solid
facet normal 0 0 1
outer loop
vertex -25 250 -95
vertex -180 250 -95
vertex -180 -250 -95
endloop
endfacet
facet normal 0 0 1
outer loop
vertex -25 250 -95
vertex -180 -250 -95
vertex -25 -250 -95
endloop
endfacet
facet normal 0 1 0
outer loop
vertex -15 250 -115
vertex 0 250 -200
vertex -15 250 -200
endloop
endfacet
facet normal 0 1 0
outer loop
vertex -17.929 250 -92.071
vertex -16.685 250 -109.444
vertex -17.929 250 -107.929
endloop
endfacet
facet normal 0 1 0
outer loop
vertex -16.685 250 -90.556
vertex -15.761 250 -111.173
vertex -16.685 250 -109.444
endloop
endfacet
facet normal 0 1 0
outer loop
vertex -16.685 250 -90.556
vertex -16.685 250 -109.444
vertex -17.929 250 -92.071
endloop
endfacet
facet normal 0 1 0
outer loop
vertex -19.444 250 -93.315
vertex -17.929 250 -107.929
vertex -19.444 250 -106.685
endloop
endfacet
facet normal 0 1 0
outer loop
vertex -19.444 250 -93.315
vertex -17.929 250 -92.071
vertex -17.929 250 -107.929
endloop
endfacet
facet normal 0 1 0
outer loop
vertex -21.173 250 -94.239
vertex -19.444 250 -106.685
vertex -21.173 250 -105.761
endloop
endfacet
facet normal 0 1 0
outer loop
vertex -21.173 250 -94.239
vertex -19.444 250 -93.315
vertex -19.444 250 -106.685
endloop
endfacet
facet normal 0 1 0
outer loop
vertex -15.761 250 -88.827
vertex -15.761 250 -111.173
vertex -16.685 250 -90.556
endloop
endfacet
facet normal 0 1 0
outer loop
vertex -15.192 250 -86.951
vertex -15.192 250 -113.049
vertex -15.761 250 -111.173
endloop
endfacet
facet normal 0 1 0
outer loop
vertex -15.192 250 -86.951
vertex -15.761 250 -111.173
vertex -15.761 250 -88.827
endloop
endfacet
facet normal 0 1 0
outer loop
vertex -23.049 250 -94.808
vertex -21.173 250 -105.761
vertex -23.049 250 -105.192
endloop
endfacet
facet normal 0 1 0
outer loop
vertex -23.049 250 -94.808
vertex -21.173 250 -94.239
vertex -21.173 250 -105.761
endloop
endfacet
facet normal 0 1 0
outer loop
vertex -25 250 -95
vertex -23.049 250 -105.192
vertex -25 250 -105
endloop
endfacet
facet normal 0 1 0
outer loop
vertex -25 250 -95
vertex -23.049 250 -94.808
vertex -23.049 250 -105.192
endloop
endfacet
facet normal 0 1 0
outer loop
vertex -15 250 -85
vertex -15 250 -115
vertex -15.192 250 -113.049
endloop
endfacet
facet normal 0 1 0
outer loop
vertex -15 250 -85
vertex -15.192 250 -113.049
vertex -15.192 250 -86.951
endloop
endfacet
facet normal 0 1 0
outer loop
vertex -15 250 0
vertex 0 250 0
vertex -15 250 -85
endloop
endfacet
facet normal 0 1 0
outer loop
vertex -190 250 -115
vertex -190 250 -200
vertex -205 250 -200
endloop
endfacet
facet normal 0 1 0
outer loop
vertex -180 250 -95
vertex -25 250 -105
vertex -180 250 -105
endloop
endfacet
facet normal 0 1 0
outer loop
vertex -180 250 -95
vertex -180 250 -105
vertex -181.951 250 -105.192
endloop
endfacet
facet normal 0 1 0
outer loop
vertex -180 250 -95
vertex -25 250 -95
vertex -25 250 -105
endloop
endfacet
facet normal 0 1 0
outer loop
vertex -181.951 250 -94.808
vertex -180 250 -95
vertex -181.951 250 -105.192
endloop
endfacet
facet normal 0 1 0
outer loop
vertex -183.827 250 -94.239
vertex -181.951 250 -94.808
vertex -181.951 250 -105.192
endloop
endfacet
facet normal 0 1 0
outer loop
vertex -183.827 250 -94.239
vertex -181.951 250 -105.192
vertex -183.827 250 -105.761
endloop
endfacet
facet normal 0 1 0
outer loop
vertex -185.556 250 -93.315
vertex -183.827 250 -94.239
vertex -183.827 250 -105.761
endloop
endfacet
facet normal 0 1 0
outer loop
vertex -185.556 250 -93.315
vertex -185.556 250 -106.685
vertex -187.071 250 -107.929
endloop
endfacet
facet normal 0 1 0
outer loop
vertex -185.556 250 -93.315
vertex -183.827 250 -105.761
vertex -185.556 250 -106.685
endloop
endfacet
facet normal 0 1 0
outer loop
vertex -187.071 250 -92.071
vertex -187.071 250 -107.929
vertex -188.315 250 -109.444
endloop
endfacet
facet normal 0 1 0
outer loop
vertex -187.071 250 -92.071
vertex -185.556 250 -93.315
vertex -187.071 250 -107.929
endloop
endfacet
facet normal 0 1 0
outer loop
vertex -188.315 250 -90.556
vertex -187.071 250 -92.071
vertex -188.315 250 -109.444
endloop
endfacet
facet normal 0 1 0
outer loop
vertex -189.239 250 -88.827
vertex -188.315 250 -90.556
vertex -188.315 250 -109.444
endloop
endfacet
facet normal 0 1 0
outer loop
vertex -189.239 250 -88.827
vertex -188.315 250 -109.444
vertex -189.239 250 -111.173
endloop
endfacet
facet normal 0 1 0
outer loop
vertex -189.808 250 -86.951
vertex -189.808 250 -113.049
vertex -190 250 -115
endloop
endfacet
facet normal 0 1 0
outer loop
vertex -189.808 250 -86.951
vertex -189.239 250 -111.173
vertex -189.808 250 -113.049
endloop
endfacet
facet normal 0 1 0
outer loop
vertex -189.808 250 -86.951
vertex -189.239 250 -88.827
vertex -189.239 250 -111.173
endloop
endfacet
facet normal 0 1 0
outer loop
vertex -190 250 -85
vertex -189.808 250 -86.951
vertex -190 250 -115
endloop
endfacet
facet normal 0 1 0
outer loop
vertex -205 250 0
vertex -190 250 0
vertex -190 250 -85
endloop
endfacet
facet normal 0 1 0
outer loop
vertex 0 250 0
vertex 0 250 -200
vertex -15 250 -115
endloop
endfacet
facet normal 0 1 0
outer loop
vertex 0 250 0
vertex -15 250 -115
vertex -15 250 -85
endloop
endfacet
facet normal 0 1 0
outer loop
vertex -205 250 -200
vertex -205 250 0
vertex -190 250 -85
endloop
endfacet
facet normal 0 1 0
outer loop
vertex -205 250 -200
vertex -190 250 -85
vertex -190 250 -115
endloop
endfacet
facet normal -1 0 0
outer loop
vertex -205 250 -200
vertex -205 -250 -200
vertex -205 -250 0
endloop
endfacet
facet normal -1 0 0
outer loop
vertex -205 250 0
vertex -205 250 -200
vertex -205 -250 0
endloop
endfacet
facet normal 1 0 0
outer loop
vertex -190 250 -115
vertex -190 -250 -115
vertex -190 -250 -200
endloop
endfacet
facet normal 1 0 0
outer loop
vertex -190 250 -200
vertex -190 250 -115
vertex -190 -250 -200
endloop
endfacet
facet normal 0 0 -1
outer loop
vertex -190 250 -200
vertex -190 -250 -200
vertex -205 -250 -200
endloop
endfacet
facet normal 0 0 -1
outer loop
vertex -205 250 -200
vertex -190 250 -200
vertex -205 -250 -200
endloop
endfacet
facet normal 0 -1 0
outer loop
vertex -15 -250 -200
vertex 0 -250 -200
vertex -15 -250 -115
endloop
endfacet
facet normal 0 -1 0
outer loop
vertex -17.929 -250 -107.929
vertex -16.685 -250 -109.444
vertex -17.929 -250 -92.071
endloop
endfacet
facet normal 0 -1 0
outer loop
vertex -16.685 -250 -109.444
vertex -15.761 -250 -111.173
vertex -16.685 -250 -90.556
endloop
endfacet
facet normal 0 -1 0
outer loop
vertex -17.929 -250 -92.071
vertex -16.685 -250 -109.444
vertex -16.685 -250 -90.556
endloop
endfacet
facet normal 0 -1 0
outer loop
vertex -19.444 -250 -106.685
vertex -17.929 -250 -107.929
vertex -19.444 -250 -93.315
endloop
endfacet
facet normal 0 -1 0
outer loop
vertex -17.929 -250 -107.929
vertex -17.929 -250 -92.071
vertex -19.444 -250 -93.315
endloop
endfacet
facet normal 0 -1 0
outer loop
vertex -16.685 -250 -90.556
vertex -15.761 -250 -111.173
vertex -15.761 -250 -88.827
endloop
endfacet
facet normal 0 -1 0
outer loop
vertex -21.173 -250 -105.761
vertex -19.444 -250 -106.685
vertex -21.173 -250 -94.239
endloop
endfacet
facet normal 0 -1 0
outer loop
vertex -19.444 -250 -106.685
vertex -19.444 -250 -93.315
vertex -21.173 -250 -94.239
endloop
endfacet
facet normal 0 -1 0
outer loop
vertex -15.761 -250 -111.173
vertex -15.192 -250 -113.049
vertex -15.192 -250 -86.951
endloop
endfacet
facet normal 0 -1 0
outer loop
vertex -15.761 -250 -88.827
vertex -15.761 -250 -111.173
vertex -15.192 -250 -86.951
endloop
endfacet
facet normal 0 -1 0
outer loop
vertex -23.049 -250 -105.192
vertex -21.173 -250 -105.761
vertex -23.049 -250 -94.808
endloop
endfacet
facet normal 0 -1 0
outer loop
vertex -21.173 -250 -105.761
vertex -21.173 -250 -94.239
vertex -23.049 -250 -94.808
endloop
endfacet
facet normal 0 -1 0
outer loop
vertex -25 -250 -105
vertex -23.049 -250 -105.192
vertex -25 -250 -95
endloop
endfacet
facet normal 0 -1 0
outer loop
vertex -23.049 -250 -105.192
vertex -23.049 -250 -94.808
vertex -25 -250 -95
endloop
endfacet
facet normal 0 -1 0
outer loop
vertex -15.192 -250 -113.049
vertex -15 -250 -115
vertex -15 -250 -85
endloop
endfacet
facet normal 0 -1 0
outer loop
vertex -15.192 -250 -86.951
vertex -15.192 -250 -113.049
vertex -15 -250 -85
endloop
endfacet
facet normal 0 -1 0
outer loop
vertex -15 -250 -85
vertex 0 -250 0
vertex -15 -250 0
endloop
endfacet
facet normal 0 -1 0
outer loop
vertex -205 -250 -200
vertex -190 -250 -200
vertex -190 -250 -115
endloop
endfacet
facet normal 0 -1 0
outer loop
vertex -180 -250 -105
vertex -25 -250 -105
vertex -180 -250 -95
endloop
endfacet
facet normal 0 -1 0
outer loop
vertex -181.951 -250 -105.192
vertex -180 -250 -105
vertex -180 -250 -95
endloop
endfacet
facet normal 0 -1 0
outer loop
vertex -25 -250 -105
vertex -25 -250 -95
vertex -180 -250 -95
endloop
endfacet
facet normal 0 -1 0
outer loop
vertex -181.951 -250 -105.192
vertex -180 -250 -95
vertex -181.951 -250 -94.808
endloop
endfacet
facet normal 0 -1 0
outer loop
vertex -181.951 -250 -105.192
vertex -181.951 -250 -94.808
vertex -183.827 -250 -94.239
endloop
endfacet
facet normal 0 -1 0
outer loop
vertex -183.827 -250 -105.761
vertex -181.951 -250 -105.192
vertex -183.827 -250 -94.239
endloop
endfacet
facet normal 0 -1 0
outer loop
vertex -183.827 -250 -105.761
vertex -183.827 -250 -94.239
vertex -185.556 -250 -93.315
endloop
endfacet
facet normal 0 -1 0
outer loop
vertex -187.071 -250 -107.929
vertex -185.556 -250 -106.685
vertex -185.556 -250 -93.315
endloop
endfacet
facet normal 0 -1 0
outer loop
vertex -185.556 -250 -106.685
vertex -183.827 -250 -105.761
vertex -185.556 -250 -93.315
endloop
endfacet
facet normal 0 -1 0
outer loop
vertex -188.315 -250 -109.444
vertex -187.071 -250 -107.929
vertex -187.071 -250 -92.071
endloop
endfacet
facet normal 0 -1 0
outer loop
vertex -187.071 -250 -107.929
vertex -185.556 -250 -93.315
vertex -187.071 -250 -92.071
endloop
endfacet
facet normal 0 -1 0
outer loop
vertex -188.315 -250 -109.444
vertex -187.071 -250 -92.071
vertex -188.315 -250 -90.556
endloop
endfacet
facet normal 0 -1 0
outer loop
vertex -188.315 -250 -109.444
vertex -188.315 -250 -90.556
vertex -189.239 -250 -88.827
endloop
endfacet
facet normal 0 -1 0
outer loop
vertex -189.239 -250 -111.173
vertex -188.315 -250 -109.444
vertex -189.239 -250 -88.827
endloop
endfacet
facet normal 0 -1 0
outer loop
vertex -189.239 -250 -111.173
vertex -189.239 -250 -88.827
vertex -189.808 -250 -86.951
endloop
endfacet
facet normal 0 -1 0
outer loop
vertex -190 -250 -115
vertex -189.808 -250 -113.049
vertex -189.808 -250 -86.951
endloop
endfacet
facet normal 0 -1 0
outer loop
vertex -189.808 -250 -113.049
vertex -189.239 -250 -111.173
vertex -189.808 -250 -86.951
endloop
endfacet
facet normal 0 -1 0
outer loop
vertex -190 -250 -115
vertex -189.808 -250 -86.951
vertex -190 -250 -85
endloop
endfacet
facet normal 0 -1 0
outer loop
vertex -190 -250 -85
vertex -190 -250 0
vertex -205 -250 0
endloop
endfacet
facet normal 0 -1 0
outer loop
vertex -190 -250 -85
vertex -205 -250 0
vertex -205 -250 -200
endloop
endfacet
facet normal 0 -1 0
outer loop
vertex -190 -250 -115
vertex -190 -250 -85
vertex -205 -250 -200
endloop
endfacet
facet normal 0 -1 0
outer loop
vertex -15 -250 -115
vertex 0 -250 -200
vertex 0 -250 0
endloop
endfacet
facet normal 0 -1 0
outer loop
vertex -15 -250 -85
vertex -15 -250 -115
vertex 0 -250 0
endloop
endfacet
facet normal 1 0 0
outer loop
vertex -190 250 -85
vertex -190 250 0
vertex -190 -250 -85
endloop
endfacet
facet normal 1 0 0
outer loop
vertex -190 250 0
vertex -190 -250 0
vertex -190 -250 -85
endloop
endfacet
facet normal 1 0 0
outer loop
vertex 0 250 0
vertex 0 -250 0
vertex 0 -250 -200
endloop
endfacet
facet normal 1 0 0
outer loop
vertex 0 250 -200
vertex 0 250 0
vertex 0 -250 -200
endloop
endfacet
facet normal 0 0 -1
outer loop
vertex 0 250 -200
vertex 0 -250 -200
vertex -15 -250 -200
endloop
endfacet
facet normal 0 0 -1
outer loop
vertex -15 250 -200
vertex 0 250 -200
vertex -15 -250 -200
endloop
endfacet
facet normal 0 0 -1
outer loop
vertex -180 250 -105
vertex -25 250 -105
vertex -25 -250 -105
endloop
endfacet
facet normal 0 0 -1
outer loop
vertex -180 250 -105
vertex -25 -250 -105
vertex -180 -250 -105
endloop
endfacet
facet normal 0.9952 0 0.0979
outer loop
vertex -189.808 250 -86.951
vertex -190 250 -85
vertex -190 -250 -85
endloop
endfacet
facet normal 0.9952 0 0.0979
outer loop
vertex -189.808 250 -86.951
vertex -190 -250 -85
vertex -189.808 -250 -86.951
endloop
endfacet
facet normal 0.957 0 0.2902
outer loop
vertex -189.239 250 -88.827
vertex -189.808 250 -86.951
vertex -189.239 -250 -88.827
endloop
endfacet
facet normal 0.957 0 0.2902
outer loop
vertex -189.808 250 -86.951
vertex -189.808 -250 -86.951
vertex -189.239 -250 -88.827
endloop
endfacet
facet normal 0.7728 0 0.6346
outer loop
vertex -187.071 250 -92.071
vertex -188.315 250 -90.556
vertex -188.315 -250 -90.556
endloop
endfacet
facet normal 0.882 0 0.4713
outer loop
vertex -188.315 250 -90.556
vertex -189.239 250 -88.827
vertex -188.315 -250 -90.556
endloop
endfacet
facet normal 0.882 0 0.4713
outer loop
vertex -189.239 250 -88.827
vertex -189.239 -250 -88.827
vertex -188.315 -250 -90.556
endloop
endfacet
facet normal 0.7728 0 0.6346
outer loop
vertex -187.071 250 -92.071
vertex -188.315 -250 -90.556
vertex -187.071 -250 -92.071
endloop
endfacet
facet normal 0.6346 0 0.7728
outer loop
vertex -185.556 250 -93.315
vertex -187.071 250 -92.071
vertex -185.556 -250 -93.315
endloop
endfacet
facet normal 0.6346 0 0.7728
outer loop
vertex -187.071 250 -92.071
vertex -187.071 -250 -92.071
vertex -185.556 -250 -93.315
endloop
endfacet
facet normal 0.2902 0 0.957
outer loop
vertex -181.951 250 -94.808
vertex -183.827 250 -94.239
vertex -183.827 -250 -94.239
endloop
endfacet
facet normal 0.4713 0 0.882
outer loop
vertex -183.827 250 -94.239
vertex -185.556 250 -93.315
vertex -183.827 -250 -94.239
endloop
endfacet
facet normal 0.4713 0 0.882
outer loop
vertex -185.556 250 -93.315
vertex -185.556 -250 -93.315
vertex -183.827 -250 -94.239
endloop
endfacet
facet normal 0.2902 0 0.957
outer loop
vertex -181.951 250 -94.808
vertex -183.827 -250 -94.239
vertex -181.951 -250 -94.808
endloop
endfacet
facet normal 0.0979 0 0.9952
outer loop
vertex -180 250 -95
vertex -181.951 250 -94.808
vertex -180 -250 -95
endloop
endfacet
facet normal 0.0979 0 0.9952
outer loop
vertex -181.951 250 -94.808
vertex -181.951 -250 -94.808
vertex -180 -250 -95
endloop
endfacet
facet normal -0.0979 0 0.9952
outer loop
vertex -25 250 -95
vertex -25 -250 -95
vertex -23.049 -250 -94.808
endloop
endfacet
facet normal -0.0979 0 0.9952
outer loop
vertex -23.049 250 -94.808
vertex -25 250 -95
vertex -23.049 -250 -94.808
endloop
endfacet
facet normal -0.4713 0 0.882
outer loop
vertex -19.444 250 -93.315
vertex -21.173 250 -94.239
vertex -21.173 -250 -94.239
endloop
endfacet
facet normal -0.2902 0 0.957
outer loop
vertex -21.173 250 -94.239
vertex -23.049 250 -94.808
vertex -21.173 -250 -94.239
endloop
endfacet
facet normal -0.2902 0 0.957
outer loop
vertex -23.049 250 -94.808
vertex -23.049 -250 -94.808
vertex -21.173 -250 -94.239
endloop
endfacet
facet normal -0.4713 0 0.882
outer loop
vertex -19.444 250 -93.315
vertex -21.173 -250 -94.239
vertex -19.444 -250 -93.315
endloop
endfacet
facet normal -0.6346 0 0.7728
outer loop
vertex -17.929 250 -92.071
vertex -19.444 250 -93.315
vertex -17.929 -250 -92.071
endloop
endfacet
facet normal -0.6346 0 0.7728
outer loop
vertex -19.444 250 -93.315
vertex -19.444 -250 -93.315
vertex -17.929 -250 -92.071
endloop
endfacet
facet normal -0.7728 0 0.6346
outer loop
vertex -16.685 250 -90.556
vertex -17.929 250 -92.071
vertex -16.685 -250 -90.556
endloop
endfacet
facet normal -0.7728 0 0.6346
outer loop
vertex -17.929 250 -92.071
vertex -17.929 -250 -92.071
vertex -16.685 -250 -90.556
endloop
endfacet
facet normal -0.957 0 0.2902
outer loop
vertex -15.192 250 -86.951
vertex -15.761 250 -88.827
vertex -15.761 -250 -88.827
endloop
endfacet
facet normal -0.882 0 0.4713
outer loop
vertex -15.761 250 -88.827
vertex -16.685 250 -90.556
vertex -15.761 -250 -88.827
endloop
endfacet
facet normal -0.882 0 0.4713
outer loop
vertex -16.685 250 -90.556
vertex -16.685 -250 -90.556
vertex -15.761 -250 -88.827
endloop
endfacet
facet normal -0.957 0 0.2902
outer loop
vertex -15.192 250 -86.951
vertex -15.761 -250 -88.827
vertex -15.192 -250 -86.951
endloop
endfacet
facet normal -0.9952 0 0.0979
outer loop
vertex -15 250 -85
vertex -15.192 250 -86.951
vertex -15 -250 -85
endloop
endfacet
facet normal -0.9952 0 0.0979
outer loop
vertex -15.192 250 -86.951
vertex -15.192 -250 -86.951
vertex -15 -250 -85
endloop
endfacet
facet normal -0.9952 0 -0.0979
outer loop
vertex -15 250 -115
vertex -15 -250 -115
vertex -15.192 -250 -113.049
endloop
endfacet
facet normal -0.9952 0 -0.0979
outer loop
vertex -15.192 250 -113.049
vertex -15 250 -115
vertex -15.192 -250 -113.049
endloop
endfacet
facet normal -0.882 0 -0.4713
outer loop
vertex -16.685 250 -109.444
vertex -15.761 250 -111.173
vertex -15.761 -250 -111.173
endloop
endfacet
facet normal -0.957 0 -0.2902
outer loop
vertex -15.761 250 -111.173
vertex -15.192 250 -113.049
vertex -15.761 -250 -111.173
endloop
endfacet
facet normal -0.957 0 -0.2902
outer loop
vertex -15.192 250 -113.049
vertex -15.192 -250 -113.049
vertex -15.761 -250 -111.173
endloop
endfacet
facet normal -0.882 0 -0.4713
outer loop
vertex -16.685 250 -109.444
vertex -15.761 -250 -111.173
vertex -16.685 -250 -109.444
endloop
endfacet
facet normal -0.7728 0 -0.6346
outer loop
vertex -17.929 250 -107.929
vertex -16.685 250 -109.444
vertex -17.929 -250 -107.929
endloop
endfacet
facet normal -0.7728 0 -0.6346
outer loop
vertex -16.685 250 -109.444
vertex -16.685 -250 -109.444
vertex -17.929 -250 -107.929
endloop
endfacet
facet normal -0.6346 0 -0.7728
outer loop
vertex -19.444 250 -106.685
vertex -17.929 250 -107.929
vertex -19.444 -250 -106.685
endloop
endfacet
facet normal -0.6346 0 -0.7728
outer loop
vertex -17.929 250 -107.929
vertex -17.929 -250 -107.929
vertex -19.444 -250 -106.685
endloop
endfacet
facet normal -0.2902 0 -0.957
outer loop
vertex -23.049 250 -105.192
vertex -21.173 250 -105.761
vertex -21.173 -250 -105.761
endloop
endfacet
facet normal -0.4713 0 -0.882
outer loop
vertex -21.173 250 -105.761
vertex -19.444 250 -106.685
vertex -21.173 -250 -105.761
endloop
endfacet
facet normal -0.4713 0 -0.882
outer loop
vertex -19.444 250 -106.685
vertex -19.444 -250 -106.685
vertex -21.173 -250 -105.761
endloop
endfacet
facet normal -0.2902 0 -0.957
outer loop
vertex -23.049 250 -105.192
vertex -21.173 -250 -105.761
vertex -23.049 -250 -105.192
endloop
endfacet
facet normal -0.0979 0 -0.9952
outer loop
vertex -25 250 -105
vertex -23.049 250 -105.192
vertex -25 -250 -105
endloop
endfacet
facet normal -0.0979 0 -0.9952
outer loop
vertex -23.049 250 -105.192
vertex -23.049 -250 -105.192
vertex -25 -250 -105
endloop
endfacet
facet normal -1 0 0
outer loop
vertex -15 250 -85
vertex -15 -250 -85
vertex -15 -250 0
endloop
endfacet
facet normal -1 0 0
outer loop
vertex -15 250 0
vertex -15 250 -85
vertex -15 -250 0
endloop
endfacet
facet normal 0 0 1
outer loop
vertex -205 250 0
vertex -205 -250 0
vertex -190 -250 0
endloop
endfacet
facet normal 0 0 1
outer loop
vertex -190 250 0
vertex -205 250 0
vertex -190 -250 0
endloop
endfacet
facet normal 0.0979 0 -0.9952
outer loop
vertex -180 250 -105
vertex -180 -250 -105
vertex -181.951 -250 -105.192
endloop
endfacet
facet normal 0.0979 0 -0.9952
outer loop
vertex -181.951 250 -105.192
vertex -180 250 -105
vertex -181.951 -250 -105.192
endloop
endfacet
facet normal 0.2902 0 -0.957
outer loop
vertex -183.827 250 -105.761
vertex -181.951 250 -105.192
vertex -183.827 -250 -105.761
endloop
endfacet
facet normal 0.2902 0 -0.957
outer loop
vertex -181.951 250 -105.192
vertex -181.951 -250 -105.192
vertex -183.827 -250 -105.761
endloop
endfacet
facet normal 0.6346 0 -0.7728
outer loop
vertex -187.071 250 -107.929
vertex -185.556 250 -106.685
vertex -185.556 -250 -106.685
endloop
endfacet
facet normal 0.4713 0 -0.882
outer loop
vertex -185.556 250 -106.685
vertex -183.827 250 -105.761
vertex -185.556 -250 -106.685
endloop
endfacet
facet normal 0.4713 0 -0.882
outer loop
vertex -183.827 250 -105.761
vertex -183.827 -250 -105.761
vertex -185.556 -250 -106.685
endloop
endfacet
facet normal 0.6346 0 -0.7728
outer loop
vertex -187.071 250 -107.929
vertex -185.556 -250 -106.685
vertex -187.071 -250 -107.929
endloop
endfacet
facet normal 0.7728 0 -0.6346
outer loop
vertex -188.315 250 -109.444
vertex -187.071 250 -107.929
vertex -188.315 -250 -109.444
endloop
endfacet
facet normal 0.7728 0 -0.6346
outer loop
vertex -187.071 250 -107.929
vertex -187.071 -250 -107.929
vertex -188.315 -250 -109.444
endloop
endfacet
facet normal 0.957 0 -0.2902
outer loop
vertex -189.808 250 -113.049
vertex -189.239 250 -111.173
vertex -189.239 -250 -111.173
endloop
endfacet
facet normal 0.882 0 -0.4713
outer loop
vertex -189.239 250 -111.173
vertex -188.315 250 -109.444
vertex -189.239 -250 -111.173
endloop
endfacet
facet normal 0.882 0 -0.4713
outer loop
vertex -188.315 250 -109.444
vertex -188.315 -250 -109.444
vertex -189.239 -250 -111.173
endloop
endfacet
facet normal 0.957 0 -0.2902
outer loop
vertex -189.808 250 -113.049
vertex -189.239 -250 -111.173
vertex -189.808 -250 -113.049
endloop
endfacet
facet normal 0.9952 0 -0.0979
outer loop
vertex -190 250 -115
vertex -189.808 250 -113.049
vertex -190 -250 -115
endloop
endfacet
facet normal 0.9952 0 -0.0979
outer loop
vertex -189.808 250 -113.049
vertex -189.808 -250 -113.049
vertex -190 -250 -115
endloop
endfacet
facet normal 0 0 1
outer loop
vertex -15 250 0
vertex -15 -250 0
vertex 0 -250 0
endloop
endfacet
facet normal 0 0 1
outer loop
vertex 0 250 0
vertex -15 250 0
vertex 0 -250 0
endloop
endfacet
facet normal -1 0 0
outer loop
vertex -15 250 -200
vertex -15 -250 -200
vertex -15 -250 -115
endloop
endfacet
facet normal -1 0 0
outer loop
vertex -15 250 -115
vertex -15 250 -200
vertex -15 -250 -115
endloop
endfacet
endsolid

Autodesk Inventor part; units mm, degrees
ref_plane "YZ Plane" through (0, 0, 0) normal (1, 0, 0) x (0, 1, 0)
ref_plane "XZ Plane" through (0, 0, 0) normal (0, 1, 0) x (-1, 0, 0)
ref_plane "XY Plane" through (0, 0, 0) normal (0, 0, 1) x (1, 0, 0)
sketch "Szkic1" plane through (0, 0, 0) normal (0, 1, 0) x (-1, 0, 0)
  line L0 (0, 0) -> (0, -200)
  line L1 (0, -200) -> (15, -200)
  line L2 (15, -200) -> (15, -105)
  line L3 (15, -105) -> (190, -105)
  line L4 (190, -105) -> (190, -200)
  line L5 (190, -200) -> (205, -200)
  line L6 (205, -200) -> (205, 0)
  line L7 (205, 0) -> (190, 0)
  line L8 (190, 0) -> (190, -95)
  line L9 (190, -95) -> (15, -95)
  line L10 (15, -95) -> (15, 0)
  line L11 (15, 0) -> (0, 0)
  line L12 (15, 0) -> (0, 0)
  dimension "d0" = 200
  dimension "d1" = 15
  dimension "d2" = 95
  dimension "d3" = 175
  dimension "d4" = 15
  dimension "d5" = 95
extrude "Wyciągnięcie proste1" add sketch "Szkic1" along normal mid plane 500
fillet "Zaokrąglenie2" radius 10 4 edges at (-190, 0, -105) (-15, 0, -105) (-15, 0, -95) (-190, 0, -95)
properties part number "Pierwszy projekt"
